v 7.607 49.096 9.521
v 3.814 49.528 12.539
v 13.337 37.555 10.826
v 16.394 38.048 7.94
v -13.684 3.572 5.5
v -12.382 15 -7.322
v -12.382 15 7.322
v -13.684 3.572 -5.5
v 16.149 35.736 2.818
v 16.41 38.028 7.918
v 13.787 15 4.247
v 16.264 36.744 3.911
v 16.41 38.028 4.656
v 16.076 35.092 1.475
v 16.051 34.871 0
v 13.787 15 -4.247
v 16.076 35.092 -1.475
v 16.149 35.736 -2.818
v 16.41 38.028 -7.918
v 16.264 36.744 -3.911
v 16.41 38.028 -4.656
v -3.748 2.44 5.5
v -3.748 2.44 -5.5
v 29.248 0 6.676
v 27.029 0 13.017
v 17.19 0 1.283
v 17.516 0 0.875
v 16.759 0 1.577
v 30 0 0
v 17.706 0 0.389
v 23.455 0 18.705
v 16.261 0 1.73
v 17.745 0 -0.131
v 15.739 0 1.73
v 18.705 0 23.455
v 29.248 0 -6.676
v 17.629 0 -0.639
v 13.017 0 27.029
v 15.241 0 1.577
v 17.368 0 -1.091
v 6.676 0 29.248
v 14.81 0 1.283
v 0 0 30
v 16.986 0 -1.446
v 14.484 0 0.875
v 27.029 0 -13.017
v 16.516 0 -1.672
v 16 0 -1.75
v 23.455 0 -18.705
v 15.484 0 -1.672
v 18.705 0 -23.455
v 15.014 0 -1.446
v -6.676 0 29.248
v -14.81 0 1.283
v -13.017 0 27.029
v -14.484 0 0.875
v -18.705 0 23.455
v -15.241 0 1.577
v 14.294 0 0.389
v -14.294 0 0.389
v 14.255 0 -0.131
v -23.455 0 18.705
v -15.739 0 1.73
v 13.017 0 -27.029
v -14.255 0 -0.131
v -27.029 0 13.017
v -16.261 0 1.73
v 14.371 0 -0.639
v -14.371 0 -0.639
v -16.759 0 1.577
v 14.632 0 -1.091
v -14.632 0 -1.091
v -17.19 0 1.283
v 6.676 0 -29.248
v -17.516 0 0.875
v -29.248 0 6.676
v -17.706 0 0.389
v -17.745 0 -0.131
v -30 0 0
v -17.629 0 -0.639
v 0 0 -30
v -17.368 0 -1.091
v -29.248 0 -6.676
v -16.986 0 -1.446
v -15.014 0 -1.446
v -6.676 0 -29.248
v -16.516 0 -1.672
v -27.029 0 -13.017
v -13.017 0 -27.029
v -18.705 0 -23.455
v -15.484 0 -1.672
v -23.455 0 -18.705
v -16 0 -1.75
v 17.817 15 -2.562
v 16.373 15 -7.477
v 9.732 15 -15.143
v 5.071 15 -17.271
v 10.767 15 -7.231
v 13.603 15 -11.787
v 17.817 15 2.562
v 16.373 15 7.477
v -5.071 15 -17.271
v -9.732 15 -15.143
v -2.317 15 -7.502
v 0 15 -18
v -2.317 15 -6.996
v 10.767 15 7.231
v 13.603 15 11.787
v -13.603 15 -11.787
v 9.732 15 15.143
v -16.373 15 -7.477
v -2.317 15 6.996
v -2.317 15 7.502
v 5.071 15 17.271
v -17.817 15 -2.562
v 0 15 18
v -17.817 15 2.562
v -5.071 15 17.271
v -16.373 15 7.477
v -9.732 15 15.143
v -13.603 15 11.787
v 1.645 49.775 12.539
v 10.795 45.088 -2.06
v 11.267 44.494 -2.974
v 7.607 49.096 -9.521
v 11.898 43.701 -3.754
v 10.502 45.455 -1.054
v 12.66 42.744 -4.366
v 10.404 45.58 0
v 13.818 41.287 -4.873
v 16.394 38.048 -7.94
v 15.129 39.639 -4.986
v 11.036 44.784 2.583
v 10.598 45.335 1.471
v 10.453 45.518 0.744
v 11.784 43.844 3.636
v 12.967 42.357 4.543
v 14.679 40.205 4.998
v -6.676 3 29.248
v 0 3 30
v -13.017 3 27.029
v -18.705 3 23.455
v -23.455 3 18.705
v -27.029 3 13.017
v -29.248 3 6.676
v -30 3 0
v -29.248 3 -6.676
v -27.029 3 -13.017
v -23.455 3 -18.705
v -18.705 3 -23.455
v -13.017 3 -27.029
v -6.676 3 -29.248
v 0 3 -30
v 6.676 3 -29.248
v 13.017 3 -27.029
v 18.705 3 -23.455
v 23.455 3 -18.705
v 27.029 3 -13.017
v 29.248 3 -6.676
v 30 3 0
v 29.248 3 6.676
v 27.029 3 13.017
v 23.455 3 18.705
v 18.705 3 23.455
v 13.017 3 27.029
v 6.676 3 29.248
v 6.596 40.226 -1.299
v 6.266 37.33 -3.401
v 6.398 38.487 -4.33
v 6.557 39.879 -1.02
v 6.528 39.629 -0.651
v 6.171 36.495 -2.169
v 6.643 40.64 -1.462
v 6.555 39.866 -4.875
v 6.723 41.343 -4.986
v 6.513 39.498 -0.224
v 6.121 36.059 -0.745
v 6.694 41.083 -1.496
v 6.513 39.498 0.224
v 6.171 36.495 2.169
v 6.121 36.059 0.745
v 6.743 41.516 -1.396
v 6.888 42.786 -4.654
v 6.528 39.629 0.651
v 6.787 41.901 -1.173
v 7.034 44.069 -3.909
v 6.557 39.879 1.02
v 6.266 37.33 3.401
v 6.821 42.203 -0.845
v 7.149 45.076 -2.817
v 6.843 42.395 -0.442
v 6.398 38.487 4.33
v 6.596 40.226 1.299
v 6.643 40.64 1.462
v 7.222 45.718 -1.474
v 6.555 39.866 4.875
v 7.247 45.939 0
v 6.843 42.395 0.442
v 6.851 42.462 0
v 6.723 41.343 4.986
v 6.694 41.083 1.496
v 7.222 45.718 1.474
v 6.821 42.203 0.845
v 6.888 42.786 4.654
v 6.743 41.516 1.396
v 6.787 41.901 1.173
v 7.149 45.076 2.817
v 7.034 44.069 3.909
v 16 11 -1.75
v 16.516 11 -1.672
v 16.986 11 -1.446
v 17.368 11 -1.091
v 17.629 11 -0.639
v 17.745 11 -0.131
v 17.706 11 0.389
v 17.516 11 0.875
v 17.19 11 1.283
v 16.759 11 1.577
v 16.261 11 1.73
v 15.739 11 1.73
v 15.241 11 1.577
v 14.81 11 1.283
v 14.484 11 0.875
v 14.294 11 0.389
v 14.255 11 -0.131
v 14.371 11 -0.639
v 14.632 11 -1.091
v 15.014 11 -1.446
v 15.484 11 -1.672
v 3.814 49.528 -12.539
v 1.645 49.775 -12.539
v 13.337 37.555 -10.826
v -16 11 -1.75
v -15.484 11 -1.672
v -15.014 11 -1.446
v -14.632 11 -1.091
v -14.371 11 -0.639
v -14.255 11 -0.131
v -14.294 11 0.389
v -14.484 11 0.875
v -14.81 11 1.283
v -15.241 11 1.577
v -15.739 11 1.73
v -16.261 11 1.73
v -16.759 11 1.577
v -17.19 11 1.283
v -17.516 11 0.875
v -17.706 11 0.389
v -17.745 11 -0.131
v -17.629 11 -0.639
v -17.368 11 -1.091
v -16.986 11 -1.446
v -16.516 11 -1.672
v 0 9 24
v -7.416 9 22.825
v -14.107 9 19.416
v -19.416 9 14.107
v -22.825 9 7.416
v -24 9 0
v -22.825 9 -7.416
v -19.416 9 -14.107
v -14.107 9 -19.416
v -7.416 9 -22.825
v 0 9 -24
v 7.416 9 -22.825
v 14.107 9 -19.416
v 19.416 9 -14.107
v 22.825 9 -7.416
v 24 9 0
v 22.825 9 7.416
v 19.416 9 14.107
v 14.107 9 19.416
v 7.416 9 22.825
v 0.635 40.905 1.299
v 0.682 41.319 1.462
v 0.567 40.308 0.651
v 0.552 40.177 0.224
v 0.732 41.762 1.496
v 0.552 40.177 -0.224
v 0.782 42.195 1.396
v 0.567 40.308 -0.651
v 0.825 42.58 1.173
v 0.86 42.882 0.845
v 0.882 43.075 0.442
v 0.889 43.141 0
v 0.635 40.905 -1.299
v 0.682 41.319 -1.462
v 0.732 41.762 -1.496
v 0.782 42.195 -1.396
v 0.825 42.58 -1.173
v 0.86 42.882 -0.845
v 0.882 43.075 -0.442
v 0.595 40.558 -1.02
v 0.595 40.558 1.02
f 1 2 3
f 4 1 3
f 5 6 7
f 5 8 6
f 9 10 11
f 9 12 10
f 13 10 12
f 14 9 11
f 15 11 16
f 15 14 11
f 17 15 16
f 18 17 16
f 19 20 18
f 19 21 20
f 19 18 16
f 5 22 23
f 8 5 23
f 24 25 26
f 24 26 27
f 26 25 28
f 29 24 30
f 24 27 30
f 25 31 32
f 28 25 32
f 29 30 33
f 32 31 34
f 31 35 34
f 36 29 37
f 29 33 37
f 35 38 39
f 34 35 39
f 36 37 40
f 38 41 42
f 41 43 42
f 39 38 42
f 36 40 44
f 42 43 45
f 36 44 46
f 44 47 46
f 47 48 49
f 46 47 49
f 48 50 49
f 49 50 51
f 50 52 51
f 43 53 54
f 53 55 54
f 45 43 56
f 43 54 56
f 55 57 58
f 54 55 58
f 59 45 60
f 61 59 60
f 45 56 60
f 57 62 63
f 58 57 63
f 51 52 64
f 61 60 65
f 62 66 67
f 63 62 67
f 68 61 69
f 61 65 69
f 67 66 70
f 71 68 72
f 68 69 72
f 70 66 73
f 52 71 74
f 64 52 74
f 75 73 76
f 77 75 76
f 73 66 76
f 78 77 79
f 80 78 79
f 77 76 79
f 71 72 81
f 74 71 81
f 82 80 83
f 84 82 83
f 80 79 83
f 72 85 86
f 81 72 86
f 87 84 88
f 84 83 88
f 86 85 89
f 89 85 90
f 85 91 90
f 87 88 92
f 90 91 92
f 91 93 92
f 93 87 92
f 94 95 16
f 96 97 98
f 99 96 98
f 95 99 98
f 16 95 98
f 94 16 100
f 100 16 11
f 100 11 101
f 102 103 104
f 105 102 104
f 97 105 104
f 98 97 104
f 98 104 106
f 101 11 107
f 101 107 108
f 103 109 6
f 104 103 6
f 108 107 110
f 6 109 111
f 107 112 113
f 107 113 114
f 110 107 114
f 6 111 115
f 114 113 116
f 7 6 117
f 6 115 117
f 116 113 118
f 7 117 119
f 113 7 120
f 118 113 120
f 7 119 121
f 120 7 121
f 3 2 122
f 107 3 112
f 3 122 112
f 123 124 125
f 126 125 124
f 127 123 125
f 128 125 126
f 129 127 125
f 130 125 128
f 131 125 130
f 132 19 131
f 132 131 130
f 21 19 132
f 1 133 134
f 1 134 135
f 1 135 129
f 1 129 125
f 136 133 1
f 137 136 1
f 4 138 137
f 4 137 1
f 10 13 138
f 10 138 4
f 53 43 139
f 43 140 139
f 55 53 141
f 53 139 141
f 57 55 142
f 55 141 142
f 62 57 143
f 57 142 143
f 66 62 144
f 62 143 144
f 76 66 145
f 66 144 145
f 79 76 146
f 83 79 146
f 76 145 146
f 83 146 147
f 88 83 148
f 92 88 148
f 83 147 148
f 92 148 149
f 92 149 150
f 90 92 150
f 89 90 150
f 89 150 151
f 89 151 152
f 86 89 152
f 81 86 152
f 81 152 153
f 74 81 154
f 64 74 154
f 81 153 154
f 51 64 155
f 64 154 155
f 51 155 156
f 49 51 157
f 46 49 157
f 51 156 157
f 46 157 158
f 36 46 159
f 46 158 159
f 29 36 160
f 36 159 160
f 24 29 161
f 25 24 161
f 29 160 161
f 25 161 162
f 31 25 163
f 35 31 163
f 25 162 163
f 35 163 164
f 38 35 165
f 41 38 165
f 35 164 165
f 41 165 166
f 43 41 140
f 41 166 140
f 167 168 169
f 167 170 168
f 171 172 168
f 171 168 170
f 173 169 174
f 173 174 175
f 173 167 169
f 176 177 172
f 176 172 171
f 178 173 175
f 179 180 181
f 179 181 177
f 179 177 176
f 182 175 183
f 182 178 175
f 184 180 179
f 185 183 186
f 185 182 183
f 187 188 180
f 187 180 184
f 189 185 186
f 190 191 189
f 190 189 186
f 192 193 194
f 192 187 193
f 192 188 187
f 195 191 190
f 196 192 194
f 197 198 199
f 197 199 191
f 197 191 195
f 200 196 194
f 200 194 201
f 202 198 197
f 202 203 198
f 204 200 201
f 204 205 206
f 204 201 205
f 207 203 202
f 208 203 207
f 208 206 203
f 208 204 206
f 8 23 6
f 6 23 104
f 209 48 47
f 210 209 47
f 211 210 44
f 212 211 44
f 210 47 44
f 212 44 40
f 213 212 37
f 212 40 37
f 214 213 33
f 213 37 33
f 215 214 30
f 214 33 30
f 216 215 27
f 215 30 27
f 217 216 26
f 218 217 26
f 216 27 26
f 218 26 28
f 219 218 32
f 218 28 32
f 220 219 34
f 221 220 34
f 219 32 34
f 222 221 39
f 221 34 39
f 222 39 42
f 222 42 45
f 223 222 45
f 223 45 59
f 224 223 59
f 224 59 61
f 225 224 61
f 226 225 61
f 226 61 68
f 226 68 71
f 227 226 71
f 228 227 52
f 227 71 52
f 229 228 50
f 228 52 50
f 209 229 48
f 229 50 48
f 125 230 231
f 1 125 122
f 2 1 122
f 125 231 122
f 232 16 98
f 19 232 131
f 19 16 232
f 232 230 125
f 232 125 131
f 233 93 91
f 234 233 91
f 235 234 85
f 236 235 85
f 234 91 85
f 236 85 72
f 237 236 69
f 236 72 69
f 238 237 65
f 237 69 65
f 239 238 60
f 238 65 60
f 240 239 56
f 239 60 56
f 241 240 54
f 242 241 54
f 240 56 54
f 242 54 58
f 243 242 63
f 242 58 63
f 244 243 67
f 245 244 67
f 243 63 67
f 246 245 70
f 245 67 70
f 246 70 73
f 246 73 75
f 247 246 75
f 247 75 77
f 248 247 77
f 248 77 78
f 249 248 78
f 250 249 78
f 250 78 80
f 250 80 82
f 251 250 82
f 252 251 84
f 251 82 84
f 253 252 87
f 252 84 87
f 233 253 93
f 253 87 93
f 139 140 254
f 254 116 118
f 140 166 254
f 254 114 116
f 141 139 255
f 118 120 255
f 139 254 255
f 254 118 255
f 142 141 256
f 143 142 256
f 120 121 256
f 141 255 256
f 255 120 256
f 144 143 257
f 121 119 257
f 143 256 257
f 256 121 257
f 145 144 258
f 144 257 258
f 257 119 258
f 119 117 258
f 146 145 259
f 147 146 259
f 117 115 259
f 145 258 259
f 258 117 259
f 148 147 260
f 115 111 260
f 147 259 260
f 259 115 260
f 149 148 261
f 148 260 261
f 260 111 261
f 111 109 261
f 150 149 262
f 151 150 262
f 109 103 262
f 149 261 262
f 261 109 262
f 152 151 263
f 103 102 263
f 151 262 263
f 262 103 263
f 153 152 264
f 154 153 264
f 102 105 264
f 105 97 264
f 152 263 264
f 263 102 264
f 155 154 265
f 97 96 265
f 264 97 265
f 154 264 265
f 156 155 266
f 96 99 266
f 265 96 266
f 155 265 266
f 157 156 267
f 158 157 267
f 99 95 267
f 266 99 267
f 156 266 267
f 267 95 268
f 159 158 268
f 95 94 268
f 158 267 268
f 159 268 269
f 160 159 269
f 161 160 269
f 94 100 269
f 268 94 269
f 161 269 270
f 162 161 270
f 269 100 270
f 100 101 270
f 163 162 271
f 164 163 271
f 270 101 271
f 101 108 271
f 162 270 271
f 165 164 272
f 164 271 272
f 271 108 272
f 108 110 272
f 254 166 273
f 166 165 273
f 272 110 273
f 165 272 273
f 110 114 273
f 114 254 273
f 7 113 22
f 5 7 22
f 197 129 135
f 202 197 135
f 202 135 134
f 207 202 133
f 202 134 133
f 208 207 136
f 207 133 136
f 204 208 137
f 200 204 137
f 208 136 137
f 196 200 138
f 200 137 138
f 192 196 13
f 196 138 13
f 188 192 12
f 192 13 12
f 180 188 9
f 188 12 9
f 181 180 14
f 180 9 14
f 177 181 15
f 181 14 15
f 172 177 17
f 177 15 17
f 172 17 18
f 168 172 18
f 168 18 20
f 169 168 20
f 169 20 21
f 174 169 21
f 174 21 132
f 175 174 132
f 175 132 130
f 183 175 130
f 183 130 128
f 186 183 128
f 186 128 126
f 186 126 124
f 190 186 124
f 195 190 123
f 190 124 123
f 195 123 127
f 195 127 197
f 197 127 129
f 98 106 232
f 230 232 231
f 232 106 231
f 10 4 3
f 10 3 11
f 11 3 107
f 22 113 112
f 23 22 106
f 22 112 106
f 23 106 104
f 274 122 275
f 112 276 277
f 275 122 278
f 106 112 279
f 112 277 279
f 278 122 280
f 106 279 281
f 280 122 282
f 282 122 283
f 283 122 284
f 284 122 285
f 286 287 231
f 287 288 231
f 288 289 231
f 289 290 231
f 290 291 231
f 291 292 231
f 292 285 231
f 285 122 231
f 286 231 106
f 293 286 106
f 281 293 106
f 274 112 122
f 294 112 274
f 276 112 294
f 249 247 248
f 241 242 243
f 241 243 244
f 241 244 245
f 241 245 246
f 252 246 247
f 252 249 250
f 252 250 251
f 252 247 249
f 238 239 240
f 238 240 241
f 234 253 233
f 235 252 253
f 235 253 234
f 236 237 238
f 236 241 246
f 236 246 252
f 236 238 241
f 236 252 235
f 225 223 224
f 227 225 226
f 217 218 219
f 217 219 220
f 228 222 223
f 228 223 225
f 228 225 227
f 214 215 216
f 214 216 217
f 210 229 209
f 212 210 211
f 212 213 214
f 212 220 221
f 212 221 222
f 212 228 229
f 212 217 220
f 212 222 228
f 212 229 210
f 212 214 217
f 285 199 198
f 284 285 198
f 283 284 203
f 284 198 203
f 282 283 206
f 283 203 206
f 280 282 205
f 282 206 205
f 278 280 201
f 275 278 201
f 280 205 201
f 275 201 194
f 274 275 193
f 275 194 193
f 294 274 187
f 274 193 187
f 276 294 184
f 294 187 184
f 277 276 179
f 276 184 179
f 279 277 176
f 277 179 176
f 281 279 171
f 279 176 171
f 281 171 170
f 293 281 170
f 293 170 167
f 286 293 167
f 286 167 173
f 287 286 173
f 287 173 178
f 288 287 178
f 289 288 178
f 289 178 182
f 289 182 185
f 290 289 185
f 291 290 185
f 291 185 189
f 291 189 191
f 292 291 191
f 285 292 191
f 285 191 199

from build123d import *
from OCP.BRepFilletAPI import BRepFilletAPI_MakeChamfer

# Parameters (mm, degrees)
CUT_EXTRUDE1_START  = -4
CUT_EXTRUDE1_DEPTH  = 10
BOSS_EXTRUDE1_DEPTH = 16
CHAMFER3_SIZE       = 10
CHAMFER1_SIZE       = 3
CHAMFER1_SIZE2      = 2.716212543
SKETCH4_R           = 1.75
CUT_EXTRUDE2_DEPTH  = 11
SKETCH5_R           = 1.5
CUT_EXTRUDE3_DEPTH  = 73.60961678
SKETCH6_R           = 5
CUT_EXTRUDE4_DEPTH  = 10


with BuildPart() as part:
    # Sketch1 → Revolve1 (revolve)
    with BuildSketch(Plane.XY):
        Polygon((-30, 0), (-30, 3), (-18, 15), (0, 15), (0, 0), align=None)
    revolve(axis=Axis((0, 15, 0), (0, -1, 0)))

    # Sketch2 → Cut-Extrude1 (cut)
    with BuildSketch(Plane(origin=(0, 0, 0), x_dir=(0, 0, 1), z_dir=(0.9935718556765875, -0.11320321376790697, 0)).offset(CUT_EXTRUDE1_START)):
        Polygon((7.866459251, -16.941235683), (5.5, -2), (-5.5, -2), (-7.866459251, -16.941235683), align=None)
    extrude(amount=-CUT_EXTRUDE1_DEPTH, mode=Mode.SUBTRACT)

    # Sketch3 → Boss-Extrude1 (add)
    with BuildSketch(Plane(origin=(-3.974287423, 0.452812855, 0), x_dir=(0, 0, 1), z_dir=(-0.9935718556765875, 0.11320321376790698, 0))):
        Polygon((-6.995953226, 14.641303557), (-12.539408637, 49.641303557), (12.539408637, 49.641303557), (6.995953226, 14.641303557), align=None)
    extrude(amount=-BOSS_EXTRUDE1_DEPTH)

    # Chamfer3
    chamfer3_edges = [part.edges().sort_by_distance(p)[0] for p in [
        (17.542417366, 47.963763528, 0),
    ]]
    chamfer(chamfer3_edges, length=CHAMFER3_SIZE)

    # Chamfer1: one chamfer whose edges measure the first distance from different faces: ONE call of the kernel's chamfer builder (chamfer() names one face for all edges)
    chamfer1_edges_1 = [part.edges().sort_by_distance(p)[0] for p in [
        (15.098528073, 26.514022486, -9.12012375),
        (15.098528073, 26.514022486, 9.12012375),
    ]]
    chamfer1_edges_2 = [part.edges().sort_by_distance(p)[0] for p in [
        (12.008542019, 43.561920319, -11.747486436),
        (12.008542019, 43.561920319, 11.747486436),
    ]]
    chamfer1_side_2 = [part.faces().sort_by_distance(p)[0] for p in [
        (11.909629587, 43.686270289, 0),
    ]]
    chamfer1 = BRepFilletAPI_MakeChamfer(part.part.solid().wrapped)
    for e in chamfer1_edges_1:
        chamfer1.Add(CHAMFER1_SIZE, e.wrapped)
    for e in chamfer1_edges_2:
        chamfer1.Add(CHAMFER1_SIZE, CHAMFER1_SIZE2, e.wrapped, chamfer1_side_2[0].wrapped)  # the first distance lies on this face
    add(Compound.cast(chamfer1.Shape()), mode=Mode.REPLACE)

    # Sketch4 → Cut-Extrude2 (cut)
    with BuildSketch(Plane.XZ):
        with Locations((-16, 0)):
            Circle(SKETCH4_R)
        with Locations((16, 0)):
            Circle(SKETCH4_R)
    extrude(amount=-CUT_EXTRUDE2_DEPTH, mode=Mode.SUBTRACT)

    # Sketch5 → Cut-Extrude3 (cut, through all)
    with BuildSketch(Plane(origin=(11.922862268, -1.358438565, 0), x_dir=(0, 0, -1), z_dir=(0.9935718556765875, -0.11320321376790698, 0))):
        with Locations((0, 41.46427329)):
            Circle(SKETCH5_R)
    extrude(amount=-CUT_EXTRUDE3_DEPTH, mode=Mode.SUBTRACT)

    # Sketch6 → Cut-Extrude4 (cut)
    with BuildSketch(Plane(origin=(11.922862268, -1.358438565, 0), x_dir=(0, 0, -1), z_dir=(0.9935718556765875, -0.11320321376790698, 0))):
        with Locations((0, 41.46427329)):
            Circle(SKETCH6_R)
    extrude(amount=-CUT_EXTRUDE4_DEPTH, mode=Mode.SUBTRACT)


solid = part.part
